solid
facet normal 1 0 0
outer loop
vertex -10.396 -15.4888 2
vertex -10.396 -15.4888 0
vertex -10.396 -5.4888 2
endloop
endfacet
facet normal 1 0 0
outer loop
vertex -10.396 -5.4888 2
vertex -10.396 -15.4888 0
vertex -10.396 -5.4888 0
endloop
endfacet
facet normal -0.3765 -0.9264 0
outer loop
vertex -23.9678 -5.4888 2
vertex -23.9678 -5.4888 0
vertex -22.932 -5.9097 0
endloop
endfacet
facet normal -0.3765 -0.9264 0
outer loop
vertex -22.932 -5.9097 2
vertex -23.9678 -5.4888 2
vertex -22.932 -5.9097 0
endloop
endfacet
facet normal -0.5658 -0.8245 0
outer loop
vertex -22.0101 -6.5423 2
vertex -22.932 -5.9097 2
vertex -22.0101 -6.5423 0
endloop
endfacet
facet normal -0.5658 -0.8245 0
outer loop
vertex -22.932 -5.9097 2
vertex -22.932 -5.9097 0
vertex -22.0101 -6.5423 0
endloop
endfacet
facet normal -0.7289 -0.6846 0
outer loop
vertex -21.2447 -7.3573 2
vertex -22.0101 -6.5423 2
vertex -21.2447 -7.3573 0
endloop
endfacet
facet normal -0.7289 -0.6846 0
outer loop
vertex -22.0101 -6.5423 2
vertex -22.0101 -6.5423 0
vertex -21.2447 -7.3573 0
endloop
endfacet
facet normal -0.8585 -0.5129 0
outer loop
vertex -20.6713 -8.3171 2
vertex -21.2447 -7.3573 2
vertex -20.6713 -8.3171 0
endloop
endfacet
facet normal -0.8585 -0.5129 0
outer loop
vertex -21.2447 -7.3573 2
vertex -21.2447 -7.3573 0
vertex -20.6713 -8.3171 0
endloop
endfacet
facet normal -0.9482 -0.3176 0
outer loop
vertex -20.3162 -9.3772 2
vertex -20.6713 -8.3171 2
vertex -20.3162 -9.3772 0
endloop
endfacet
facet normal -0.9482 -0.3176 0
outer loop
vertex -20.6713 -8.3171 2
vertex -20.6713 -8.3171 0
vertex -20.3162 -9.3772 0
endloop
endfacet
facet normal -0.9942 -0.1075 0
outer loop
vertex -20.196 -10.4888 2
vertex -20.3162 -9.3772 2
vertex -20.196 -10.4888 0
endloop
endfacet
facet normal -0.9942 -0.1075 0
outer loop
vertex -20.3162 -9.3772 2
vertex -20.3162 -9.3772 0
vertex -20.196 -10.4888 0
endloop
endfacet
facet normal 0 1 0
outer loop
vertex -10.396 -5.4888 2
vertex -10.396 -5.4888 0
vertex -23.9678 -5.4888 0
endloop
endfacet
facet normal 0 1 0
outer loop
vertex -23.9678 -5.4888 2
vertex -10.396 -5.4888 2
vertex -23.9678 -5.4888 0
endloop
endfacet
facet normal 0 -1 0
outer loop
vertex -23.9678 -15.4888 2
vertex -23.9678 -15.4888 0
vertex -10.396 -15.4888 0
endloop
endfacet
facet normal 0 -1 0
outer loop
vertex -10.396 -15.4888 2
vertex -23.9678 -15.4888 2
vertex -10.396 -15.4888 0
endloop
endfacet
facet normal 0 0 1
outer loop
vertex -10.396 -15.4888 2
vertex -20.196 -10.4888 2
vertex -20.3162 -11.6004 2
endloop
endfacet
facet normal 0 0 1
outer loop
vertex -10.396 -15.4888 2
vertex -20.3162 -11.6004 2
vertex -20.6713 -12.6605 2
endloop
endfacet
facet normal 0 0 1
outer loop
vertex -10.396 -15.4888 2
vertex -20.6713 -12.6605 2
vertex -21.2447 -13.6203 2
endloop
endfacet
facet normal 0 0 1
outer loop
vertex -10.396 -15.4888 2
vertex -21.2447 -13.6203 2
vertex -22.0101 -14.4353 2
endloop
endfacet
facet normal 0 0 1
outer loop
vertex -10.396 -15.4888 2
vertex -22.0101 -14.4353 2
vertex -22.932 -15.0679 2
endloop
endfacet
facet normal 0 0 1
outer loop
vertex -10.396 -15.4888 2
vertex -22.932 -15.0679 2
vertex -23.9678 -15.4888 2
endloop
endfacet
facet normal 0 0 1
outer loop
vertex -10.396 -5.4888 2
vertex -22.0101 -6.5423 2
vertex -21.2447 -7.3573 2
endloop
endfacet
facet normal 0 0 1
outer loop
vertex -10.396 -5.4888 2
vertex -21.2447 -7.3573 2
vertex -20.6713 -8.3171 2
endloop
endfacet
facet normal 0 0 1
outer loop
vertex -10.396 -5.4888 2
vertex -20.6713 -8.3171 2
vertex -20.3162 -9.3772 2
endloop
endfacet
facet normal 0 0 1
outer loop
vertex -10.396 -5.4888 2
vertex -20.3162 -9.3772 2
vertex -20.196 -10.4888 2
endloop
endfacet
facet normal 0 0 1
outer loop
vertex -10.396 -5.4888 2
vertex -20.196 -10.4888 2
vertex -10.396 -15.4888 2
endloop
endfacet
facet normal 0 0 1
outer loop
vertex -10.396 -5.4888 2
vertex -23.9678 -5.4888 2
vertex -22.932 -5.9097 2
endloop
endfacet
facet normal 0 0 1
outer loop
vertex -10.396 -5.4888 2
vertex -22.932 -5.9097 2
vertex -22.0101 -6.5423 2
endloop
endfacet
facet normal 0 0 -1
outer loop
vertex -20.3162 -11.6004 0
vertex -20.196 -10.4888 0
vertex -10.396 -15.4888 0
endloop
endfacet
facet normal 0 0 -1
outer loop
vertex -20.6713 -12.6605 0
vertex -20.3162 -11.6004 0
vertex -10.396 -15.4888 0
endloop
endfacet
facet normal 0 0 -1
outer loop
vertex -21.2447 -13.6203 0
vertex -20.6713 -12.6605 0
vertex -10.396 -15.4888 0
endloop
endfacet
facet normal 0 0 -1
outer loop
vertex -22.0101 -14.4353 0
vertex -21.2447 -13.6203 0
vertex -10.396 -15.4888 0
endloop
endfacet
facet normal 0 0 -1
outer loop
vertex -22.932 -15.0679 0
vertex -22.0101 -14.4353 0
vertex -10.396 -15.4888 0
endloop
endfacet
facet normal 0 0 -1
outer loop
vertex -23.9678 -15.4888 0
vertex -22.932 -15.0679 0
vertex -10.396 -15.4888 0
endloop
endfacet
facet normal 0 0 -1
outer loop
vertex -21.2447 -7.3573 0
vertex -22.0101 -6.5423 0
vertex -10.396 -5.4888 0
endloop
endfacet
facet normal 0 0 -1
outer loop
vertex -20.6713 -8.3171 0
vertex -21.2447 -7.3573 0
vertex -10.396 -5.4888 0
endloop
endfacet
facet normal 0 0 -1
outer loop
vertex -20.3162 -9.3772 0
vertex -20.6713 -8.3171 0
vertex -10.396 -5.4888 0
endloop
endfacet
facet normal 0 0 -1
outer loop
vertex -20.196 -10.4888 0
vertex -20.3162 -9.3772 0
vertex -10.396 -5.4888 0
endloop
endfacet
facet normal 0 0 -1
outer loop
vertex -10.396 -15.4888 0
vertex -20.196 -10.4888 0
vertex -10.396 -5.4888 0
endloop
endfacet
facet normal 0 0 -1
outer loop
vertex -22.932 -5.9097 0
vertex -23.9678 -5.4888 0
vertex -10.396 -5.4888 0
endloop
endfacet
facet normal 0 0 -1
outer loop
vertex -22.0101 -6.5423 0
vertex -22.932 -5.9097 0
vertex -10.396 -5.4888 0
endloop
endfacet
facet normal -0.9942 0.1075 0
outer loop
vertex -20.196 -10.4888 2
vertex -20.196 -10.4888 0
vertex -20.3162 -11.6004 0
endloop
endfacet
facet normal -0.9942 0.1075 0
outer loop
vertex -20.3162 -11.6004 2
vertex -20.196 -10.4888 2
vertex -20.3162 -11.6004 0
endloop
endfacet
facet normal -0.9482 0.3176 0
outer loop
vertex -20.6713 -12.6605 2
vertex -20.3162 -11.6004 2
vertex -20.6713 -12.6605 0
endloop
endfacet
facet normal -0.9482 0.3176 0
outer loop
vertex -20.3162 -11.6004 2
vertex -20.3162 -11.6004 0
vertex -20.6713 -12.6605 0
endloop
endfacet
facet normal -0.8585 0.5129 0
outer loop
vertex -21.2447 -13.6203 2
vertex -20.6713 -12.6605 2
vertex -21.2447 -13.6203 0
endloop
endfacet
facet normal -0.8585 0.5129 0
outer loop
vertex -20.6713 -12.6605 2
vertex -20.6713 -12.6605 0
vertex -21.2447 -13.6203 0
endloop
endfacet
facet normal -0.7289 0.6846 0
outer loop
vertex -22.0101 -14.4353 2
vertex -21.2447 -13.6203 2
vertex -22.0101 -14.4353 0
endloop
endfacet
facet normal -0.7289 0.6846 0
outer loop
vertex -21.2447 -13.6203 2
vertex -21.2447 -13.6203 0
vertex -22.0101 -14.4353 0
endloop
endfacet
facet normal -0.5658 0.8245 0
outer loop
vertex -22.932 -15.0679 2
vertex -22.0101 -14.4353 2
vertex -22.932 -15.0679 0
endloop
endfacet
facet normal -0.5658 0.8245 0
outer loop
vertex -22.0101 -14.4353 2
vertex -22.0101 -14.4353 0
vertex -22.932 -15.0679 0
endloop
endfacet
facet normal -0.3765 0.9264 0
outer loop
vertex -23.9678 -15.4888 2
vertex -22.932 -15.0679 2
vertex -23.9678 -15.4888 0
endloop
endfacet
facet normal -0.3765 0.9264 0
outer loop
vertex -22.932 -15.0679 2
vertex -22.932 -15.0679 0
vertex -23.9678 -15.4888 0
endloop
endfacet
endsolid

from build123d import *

# Parameters (mm, degrees)
BOSS_EXTRUDE1_DEPTH = 2


with BuildPart() as part:
    # Sketch1 → Boss-Extrude1 (new body)
    with BuildSketch(Plane.XY):
        with BuildLine():
            Line((-10.396049823, -5.488799617), (-23.967764137, -5.488799617))
            ThreePointArc((-23.967764137, -5.488799617), (-21.24471958, -7.357273277), (-20.196049823, -10.488799617))
            ThreePointArc((-20.196049823, -10.488799617), (-21.24471958, -13.620325957), (-23.967764137, -15.488799617))
            Line((-23.967764137, -15.488799617), (-10.396049823, -15.488799617))
            Line((-10.396049823, -15.488799617), (-10.396049823, -5.488799617))
        make_face()
    extrude(amount=BOSS_EXTRUDE1_DEPTH)


solid = part.part
